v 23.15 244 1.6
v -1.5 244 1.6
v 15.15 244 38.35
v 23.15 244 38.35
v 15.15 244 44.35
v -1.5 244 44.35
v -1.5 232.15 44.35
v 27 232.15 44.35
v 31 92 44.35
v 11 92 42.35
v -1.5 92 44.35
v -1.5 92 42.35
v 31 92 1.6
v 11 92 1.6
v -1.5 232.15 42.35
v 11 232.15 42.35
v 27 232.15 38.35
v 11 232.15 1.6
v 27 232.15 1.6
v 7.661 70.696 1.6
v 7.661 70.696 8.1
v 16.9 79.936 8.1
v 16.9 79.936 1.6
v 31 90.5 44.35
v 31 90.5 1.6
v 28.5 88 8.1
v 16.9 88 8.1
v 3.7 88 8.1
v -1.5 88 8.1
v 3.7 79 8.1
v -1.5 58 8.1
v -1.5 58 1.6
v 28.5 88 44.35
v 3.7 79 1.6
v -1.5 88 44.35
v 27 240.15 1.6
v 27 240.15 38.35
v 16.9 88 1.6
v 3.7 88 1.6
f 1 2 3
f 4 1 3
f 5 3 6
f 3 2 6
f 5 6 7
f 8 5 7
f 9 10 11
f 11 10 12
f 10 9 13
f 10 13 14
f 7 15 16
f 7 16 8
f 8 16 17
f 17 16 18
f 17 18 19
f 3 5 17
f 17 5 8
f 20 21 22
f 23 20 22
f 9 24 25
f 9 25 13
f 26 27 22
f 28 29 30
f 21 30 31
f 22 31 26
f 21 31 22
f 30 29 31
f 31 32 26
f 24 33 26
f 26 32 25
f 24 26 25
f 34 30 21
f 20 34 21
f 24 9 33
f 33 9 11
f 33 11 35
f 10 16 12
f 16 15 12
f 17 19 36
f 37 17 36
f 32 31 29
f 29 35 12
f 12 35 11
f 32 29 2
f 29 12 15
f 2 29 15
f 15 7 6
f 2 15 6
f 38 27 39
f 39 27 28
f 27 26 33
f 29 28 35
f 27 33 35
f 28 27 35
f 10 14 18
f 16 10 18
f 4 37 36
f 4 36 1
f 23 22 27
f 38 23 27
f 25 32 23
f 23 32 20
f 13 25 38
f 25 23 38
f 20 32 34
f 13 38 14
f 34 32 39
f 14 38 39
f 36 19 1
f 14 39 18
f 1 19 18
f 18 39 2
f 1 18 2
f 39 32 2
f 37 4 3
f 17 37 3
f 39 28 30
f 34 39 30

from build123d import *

# Parameters (mm, degrees)
PAD065_DEPTH      = 1.5
PAD065_DEPTH_BACK = 31
POCKET022_DEPTH   = 42.751
POCKET023_DEPTH   = 6
POCKET024_DEPTH   = 6.501


with BuildPart() as part:
    # Sketch105 → Pad065 (new body, two sides)
    with BuildSketch(Plane(origin=(0, 0, 0), x_dir=(0, -1, 0), z_dir=(-1, 0, 0))) as pad065_sk:
        Polygon((-58, 1.6), (-244, 1.6), (-244, 44.35), (-232.15, 44.35), (-232.15, 42.35), (-92, 42.35), (-92, 44.35), (-88, 44.35), (-88, 8.1), (-58, 8.1), align=None)
    extrude(amount=PAD065_DEPTH)
    extrude(pad065_sk.sketch, amount=-PAD065_DEPTH_BACK)

    # Sketch106 (on Face1 of Pad065) → Pocket022 (cut, through all)
    with BuildSketch(Plane.YX.offset(-1.6)):
        Polygon((48.3023801265, -11.1976198735), (92, 32.5), (92, 11), (232.15, 11), (232.15, 27), (240.15, 27), (258.8163982142, 8.3336017858), (258.8163982142, 61.252958), (48.3023801265, 61.252958), align=None)
    extrude(amount=-POCKET022_DEPTH, mode=Mode.SUBTRACT)

    # Sketch107 (on Face17 of Pocket022) → Pocket023 (cut)
    with BuildSketch(Plane(origin=(0, 0, 44.35), x_dir=(0, -1, 0), z_dir=(0, 0, 1))):
        Polygon((-249.5028966484, 34.5330350464), (-249.5028966484, 9.6471033517), (-224.6169649536, 34.5330350464), align=None)
    extrude(amount=-POCKET023_DEPTH, mode=Mode.SUBTRACT)

    # Sketch108 (on Face13 of Pocket023) → Pocket024 (cut, through all)
    with BuildSketch(Plane(origin=(0, 0, 8.1), x_dir=(0, -1, 0), z_dir=(0, 0, 1))):
        Polygon((-88, 16.9), (-88, 3.7), (-79, 3.7), (-70.6961965864, 7.6606626805), (-79.9355339059, 16.9), align=None)
    extrude(amount=-POCKET024_DEPTH, mode=Mode.SUBTRACT)


solid = part.part
